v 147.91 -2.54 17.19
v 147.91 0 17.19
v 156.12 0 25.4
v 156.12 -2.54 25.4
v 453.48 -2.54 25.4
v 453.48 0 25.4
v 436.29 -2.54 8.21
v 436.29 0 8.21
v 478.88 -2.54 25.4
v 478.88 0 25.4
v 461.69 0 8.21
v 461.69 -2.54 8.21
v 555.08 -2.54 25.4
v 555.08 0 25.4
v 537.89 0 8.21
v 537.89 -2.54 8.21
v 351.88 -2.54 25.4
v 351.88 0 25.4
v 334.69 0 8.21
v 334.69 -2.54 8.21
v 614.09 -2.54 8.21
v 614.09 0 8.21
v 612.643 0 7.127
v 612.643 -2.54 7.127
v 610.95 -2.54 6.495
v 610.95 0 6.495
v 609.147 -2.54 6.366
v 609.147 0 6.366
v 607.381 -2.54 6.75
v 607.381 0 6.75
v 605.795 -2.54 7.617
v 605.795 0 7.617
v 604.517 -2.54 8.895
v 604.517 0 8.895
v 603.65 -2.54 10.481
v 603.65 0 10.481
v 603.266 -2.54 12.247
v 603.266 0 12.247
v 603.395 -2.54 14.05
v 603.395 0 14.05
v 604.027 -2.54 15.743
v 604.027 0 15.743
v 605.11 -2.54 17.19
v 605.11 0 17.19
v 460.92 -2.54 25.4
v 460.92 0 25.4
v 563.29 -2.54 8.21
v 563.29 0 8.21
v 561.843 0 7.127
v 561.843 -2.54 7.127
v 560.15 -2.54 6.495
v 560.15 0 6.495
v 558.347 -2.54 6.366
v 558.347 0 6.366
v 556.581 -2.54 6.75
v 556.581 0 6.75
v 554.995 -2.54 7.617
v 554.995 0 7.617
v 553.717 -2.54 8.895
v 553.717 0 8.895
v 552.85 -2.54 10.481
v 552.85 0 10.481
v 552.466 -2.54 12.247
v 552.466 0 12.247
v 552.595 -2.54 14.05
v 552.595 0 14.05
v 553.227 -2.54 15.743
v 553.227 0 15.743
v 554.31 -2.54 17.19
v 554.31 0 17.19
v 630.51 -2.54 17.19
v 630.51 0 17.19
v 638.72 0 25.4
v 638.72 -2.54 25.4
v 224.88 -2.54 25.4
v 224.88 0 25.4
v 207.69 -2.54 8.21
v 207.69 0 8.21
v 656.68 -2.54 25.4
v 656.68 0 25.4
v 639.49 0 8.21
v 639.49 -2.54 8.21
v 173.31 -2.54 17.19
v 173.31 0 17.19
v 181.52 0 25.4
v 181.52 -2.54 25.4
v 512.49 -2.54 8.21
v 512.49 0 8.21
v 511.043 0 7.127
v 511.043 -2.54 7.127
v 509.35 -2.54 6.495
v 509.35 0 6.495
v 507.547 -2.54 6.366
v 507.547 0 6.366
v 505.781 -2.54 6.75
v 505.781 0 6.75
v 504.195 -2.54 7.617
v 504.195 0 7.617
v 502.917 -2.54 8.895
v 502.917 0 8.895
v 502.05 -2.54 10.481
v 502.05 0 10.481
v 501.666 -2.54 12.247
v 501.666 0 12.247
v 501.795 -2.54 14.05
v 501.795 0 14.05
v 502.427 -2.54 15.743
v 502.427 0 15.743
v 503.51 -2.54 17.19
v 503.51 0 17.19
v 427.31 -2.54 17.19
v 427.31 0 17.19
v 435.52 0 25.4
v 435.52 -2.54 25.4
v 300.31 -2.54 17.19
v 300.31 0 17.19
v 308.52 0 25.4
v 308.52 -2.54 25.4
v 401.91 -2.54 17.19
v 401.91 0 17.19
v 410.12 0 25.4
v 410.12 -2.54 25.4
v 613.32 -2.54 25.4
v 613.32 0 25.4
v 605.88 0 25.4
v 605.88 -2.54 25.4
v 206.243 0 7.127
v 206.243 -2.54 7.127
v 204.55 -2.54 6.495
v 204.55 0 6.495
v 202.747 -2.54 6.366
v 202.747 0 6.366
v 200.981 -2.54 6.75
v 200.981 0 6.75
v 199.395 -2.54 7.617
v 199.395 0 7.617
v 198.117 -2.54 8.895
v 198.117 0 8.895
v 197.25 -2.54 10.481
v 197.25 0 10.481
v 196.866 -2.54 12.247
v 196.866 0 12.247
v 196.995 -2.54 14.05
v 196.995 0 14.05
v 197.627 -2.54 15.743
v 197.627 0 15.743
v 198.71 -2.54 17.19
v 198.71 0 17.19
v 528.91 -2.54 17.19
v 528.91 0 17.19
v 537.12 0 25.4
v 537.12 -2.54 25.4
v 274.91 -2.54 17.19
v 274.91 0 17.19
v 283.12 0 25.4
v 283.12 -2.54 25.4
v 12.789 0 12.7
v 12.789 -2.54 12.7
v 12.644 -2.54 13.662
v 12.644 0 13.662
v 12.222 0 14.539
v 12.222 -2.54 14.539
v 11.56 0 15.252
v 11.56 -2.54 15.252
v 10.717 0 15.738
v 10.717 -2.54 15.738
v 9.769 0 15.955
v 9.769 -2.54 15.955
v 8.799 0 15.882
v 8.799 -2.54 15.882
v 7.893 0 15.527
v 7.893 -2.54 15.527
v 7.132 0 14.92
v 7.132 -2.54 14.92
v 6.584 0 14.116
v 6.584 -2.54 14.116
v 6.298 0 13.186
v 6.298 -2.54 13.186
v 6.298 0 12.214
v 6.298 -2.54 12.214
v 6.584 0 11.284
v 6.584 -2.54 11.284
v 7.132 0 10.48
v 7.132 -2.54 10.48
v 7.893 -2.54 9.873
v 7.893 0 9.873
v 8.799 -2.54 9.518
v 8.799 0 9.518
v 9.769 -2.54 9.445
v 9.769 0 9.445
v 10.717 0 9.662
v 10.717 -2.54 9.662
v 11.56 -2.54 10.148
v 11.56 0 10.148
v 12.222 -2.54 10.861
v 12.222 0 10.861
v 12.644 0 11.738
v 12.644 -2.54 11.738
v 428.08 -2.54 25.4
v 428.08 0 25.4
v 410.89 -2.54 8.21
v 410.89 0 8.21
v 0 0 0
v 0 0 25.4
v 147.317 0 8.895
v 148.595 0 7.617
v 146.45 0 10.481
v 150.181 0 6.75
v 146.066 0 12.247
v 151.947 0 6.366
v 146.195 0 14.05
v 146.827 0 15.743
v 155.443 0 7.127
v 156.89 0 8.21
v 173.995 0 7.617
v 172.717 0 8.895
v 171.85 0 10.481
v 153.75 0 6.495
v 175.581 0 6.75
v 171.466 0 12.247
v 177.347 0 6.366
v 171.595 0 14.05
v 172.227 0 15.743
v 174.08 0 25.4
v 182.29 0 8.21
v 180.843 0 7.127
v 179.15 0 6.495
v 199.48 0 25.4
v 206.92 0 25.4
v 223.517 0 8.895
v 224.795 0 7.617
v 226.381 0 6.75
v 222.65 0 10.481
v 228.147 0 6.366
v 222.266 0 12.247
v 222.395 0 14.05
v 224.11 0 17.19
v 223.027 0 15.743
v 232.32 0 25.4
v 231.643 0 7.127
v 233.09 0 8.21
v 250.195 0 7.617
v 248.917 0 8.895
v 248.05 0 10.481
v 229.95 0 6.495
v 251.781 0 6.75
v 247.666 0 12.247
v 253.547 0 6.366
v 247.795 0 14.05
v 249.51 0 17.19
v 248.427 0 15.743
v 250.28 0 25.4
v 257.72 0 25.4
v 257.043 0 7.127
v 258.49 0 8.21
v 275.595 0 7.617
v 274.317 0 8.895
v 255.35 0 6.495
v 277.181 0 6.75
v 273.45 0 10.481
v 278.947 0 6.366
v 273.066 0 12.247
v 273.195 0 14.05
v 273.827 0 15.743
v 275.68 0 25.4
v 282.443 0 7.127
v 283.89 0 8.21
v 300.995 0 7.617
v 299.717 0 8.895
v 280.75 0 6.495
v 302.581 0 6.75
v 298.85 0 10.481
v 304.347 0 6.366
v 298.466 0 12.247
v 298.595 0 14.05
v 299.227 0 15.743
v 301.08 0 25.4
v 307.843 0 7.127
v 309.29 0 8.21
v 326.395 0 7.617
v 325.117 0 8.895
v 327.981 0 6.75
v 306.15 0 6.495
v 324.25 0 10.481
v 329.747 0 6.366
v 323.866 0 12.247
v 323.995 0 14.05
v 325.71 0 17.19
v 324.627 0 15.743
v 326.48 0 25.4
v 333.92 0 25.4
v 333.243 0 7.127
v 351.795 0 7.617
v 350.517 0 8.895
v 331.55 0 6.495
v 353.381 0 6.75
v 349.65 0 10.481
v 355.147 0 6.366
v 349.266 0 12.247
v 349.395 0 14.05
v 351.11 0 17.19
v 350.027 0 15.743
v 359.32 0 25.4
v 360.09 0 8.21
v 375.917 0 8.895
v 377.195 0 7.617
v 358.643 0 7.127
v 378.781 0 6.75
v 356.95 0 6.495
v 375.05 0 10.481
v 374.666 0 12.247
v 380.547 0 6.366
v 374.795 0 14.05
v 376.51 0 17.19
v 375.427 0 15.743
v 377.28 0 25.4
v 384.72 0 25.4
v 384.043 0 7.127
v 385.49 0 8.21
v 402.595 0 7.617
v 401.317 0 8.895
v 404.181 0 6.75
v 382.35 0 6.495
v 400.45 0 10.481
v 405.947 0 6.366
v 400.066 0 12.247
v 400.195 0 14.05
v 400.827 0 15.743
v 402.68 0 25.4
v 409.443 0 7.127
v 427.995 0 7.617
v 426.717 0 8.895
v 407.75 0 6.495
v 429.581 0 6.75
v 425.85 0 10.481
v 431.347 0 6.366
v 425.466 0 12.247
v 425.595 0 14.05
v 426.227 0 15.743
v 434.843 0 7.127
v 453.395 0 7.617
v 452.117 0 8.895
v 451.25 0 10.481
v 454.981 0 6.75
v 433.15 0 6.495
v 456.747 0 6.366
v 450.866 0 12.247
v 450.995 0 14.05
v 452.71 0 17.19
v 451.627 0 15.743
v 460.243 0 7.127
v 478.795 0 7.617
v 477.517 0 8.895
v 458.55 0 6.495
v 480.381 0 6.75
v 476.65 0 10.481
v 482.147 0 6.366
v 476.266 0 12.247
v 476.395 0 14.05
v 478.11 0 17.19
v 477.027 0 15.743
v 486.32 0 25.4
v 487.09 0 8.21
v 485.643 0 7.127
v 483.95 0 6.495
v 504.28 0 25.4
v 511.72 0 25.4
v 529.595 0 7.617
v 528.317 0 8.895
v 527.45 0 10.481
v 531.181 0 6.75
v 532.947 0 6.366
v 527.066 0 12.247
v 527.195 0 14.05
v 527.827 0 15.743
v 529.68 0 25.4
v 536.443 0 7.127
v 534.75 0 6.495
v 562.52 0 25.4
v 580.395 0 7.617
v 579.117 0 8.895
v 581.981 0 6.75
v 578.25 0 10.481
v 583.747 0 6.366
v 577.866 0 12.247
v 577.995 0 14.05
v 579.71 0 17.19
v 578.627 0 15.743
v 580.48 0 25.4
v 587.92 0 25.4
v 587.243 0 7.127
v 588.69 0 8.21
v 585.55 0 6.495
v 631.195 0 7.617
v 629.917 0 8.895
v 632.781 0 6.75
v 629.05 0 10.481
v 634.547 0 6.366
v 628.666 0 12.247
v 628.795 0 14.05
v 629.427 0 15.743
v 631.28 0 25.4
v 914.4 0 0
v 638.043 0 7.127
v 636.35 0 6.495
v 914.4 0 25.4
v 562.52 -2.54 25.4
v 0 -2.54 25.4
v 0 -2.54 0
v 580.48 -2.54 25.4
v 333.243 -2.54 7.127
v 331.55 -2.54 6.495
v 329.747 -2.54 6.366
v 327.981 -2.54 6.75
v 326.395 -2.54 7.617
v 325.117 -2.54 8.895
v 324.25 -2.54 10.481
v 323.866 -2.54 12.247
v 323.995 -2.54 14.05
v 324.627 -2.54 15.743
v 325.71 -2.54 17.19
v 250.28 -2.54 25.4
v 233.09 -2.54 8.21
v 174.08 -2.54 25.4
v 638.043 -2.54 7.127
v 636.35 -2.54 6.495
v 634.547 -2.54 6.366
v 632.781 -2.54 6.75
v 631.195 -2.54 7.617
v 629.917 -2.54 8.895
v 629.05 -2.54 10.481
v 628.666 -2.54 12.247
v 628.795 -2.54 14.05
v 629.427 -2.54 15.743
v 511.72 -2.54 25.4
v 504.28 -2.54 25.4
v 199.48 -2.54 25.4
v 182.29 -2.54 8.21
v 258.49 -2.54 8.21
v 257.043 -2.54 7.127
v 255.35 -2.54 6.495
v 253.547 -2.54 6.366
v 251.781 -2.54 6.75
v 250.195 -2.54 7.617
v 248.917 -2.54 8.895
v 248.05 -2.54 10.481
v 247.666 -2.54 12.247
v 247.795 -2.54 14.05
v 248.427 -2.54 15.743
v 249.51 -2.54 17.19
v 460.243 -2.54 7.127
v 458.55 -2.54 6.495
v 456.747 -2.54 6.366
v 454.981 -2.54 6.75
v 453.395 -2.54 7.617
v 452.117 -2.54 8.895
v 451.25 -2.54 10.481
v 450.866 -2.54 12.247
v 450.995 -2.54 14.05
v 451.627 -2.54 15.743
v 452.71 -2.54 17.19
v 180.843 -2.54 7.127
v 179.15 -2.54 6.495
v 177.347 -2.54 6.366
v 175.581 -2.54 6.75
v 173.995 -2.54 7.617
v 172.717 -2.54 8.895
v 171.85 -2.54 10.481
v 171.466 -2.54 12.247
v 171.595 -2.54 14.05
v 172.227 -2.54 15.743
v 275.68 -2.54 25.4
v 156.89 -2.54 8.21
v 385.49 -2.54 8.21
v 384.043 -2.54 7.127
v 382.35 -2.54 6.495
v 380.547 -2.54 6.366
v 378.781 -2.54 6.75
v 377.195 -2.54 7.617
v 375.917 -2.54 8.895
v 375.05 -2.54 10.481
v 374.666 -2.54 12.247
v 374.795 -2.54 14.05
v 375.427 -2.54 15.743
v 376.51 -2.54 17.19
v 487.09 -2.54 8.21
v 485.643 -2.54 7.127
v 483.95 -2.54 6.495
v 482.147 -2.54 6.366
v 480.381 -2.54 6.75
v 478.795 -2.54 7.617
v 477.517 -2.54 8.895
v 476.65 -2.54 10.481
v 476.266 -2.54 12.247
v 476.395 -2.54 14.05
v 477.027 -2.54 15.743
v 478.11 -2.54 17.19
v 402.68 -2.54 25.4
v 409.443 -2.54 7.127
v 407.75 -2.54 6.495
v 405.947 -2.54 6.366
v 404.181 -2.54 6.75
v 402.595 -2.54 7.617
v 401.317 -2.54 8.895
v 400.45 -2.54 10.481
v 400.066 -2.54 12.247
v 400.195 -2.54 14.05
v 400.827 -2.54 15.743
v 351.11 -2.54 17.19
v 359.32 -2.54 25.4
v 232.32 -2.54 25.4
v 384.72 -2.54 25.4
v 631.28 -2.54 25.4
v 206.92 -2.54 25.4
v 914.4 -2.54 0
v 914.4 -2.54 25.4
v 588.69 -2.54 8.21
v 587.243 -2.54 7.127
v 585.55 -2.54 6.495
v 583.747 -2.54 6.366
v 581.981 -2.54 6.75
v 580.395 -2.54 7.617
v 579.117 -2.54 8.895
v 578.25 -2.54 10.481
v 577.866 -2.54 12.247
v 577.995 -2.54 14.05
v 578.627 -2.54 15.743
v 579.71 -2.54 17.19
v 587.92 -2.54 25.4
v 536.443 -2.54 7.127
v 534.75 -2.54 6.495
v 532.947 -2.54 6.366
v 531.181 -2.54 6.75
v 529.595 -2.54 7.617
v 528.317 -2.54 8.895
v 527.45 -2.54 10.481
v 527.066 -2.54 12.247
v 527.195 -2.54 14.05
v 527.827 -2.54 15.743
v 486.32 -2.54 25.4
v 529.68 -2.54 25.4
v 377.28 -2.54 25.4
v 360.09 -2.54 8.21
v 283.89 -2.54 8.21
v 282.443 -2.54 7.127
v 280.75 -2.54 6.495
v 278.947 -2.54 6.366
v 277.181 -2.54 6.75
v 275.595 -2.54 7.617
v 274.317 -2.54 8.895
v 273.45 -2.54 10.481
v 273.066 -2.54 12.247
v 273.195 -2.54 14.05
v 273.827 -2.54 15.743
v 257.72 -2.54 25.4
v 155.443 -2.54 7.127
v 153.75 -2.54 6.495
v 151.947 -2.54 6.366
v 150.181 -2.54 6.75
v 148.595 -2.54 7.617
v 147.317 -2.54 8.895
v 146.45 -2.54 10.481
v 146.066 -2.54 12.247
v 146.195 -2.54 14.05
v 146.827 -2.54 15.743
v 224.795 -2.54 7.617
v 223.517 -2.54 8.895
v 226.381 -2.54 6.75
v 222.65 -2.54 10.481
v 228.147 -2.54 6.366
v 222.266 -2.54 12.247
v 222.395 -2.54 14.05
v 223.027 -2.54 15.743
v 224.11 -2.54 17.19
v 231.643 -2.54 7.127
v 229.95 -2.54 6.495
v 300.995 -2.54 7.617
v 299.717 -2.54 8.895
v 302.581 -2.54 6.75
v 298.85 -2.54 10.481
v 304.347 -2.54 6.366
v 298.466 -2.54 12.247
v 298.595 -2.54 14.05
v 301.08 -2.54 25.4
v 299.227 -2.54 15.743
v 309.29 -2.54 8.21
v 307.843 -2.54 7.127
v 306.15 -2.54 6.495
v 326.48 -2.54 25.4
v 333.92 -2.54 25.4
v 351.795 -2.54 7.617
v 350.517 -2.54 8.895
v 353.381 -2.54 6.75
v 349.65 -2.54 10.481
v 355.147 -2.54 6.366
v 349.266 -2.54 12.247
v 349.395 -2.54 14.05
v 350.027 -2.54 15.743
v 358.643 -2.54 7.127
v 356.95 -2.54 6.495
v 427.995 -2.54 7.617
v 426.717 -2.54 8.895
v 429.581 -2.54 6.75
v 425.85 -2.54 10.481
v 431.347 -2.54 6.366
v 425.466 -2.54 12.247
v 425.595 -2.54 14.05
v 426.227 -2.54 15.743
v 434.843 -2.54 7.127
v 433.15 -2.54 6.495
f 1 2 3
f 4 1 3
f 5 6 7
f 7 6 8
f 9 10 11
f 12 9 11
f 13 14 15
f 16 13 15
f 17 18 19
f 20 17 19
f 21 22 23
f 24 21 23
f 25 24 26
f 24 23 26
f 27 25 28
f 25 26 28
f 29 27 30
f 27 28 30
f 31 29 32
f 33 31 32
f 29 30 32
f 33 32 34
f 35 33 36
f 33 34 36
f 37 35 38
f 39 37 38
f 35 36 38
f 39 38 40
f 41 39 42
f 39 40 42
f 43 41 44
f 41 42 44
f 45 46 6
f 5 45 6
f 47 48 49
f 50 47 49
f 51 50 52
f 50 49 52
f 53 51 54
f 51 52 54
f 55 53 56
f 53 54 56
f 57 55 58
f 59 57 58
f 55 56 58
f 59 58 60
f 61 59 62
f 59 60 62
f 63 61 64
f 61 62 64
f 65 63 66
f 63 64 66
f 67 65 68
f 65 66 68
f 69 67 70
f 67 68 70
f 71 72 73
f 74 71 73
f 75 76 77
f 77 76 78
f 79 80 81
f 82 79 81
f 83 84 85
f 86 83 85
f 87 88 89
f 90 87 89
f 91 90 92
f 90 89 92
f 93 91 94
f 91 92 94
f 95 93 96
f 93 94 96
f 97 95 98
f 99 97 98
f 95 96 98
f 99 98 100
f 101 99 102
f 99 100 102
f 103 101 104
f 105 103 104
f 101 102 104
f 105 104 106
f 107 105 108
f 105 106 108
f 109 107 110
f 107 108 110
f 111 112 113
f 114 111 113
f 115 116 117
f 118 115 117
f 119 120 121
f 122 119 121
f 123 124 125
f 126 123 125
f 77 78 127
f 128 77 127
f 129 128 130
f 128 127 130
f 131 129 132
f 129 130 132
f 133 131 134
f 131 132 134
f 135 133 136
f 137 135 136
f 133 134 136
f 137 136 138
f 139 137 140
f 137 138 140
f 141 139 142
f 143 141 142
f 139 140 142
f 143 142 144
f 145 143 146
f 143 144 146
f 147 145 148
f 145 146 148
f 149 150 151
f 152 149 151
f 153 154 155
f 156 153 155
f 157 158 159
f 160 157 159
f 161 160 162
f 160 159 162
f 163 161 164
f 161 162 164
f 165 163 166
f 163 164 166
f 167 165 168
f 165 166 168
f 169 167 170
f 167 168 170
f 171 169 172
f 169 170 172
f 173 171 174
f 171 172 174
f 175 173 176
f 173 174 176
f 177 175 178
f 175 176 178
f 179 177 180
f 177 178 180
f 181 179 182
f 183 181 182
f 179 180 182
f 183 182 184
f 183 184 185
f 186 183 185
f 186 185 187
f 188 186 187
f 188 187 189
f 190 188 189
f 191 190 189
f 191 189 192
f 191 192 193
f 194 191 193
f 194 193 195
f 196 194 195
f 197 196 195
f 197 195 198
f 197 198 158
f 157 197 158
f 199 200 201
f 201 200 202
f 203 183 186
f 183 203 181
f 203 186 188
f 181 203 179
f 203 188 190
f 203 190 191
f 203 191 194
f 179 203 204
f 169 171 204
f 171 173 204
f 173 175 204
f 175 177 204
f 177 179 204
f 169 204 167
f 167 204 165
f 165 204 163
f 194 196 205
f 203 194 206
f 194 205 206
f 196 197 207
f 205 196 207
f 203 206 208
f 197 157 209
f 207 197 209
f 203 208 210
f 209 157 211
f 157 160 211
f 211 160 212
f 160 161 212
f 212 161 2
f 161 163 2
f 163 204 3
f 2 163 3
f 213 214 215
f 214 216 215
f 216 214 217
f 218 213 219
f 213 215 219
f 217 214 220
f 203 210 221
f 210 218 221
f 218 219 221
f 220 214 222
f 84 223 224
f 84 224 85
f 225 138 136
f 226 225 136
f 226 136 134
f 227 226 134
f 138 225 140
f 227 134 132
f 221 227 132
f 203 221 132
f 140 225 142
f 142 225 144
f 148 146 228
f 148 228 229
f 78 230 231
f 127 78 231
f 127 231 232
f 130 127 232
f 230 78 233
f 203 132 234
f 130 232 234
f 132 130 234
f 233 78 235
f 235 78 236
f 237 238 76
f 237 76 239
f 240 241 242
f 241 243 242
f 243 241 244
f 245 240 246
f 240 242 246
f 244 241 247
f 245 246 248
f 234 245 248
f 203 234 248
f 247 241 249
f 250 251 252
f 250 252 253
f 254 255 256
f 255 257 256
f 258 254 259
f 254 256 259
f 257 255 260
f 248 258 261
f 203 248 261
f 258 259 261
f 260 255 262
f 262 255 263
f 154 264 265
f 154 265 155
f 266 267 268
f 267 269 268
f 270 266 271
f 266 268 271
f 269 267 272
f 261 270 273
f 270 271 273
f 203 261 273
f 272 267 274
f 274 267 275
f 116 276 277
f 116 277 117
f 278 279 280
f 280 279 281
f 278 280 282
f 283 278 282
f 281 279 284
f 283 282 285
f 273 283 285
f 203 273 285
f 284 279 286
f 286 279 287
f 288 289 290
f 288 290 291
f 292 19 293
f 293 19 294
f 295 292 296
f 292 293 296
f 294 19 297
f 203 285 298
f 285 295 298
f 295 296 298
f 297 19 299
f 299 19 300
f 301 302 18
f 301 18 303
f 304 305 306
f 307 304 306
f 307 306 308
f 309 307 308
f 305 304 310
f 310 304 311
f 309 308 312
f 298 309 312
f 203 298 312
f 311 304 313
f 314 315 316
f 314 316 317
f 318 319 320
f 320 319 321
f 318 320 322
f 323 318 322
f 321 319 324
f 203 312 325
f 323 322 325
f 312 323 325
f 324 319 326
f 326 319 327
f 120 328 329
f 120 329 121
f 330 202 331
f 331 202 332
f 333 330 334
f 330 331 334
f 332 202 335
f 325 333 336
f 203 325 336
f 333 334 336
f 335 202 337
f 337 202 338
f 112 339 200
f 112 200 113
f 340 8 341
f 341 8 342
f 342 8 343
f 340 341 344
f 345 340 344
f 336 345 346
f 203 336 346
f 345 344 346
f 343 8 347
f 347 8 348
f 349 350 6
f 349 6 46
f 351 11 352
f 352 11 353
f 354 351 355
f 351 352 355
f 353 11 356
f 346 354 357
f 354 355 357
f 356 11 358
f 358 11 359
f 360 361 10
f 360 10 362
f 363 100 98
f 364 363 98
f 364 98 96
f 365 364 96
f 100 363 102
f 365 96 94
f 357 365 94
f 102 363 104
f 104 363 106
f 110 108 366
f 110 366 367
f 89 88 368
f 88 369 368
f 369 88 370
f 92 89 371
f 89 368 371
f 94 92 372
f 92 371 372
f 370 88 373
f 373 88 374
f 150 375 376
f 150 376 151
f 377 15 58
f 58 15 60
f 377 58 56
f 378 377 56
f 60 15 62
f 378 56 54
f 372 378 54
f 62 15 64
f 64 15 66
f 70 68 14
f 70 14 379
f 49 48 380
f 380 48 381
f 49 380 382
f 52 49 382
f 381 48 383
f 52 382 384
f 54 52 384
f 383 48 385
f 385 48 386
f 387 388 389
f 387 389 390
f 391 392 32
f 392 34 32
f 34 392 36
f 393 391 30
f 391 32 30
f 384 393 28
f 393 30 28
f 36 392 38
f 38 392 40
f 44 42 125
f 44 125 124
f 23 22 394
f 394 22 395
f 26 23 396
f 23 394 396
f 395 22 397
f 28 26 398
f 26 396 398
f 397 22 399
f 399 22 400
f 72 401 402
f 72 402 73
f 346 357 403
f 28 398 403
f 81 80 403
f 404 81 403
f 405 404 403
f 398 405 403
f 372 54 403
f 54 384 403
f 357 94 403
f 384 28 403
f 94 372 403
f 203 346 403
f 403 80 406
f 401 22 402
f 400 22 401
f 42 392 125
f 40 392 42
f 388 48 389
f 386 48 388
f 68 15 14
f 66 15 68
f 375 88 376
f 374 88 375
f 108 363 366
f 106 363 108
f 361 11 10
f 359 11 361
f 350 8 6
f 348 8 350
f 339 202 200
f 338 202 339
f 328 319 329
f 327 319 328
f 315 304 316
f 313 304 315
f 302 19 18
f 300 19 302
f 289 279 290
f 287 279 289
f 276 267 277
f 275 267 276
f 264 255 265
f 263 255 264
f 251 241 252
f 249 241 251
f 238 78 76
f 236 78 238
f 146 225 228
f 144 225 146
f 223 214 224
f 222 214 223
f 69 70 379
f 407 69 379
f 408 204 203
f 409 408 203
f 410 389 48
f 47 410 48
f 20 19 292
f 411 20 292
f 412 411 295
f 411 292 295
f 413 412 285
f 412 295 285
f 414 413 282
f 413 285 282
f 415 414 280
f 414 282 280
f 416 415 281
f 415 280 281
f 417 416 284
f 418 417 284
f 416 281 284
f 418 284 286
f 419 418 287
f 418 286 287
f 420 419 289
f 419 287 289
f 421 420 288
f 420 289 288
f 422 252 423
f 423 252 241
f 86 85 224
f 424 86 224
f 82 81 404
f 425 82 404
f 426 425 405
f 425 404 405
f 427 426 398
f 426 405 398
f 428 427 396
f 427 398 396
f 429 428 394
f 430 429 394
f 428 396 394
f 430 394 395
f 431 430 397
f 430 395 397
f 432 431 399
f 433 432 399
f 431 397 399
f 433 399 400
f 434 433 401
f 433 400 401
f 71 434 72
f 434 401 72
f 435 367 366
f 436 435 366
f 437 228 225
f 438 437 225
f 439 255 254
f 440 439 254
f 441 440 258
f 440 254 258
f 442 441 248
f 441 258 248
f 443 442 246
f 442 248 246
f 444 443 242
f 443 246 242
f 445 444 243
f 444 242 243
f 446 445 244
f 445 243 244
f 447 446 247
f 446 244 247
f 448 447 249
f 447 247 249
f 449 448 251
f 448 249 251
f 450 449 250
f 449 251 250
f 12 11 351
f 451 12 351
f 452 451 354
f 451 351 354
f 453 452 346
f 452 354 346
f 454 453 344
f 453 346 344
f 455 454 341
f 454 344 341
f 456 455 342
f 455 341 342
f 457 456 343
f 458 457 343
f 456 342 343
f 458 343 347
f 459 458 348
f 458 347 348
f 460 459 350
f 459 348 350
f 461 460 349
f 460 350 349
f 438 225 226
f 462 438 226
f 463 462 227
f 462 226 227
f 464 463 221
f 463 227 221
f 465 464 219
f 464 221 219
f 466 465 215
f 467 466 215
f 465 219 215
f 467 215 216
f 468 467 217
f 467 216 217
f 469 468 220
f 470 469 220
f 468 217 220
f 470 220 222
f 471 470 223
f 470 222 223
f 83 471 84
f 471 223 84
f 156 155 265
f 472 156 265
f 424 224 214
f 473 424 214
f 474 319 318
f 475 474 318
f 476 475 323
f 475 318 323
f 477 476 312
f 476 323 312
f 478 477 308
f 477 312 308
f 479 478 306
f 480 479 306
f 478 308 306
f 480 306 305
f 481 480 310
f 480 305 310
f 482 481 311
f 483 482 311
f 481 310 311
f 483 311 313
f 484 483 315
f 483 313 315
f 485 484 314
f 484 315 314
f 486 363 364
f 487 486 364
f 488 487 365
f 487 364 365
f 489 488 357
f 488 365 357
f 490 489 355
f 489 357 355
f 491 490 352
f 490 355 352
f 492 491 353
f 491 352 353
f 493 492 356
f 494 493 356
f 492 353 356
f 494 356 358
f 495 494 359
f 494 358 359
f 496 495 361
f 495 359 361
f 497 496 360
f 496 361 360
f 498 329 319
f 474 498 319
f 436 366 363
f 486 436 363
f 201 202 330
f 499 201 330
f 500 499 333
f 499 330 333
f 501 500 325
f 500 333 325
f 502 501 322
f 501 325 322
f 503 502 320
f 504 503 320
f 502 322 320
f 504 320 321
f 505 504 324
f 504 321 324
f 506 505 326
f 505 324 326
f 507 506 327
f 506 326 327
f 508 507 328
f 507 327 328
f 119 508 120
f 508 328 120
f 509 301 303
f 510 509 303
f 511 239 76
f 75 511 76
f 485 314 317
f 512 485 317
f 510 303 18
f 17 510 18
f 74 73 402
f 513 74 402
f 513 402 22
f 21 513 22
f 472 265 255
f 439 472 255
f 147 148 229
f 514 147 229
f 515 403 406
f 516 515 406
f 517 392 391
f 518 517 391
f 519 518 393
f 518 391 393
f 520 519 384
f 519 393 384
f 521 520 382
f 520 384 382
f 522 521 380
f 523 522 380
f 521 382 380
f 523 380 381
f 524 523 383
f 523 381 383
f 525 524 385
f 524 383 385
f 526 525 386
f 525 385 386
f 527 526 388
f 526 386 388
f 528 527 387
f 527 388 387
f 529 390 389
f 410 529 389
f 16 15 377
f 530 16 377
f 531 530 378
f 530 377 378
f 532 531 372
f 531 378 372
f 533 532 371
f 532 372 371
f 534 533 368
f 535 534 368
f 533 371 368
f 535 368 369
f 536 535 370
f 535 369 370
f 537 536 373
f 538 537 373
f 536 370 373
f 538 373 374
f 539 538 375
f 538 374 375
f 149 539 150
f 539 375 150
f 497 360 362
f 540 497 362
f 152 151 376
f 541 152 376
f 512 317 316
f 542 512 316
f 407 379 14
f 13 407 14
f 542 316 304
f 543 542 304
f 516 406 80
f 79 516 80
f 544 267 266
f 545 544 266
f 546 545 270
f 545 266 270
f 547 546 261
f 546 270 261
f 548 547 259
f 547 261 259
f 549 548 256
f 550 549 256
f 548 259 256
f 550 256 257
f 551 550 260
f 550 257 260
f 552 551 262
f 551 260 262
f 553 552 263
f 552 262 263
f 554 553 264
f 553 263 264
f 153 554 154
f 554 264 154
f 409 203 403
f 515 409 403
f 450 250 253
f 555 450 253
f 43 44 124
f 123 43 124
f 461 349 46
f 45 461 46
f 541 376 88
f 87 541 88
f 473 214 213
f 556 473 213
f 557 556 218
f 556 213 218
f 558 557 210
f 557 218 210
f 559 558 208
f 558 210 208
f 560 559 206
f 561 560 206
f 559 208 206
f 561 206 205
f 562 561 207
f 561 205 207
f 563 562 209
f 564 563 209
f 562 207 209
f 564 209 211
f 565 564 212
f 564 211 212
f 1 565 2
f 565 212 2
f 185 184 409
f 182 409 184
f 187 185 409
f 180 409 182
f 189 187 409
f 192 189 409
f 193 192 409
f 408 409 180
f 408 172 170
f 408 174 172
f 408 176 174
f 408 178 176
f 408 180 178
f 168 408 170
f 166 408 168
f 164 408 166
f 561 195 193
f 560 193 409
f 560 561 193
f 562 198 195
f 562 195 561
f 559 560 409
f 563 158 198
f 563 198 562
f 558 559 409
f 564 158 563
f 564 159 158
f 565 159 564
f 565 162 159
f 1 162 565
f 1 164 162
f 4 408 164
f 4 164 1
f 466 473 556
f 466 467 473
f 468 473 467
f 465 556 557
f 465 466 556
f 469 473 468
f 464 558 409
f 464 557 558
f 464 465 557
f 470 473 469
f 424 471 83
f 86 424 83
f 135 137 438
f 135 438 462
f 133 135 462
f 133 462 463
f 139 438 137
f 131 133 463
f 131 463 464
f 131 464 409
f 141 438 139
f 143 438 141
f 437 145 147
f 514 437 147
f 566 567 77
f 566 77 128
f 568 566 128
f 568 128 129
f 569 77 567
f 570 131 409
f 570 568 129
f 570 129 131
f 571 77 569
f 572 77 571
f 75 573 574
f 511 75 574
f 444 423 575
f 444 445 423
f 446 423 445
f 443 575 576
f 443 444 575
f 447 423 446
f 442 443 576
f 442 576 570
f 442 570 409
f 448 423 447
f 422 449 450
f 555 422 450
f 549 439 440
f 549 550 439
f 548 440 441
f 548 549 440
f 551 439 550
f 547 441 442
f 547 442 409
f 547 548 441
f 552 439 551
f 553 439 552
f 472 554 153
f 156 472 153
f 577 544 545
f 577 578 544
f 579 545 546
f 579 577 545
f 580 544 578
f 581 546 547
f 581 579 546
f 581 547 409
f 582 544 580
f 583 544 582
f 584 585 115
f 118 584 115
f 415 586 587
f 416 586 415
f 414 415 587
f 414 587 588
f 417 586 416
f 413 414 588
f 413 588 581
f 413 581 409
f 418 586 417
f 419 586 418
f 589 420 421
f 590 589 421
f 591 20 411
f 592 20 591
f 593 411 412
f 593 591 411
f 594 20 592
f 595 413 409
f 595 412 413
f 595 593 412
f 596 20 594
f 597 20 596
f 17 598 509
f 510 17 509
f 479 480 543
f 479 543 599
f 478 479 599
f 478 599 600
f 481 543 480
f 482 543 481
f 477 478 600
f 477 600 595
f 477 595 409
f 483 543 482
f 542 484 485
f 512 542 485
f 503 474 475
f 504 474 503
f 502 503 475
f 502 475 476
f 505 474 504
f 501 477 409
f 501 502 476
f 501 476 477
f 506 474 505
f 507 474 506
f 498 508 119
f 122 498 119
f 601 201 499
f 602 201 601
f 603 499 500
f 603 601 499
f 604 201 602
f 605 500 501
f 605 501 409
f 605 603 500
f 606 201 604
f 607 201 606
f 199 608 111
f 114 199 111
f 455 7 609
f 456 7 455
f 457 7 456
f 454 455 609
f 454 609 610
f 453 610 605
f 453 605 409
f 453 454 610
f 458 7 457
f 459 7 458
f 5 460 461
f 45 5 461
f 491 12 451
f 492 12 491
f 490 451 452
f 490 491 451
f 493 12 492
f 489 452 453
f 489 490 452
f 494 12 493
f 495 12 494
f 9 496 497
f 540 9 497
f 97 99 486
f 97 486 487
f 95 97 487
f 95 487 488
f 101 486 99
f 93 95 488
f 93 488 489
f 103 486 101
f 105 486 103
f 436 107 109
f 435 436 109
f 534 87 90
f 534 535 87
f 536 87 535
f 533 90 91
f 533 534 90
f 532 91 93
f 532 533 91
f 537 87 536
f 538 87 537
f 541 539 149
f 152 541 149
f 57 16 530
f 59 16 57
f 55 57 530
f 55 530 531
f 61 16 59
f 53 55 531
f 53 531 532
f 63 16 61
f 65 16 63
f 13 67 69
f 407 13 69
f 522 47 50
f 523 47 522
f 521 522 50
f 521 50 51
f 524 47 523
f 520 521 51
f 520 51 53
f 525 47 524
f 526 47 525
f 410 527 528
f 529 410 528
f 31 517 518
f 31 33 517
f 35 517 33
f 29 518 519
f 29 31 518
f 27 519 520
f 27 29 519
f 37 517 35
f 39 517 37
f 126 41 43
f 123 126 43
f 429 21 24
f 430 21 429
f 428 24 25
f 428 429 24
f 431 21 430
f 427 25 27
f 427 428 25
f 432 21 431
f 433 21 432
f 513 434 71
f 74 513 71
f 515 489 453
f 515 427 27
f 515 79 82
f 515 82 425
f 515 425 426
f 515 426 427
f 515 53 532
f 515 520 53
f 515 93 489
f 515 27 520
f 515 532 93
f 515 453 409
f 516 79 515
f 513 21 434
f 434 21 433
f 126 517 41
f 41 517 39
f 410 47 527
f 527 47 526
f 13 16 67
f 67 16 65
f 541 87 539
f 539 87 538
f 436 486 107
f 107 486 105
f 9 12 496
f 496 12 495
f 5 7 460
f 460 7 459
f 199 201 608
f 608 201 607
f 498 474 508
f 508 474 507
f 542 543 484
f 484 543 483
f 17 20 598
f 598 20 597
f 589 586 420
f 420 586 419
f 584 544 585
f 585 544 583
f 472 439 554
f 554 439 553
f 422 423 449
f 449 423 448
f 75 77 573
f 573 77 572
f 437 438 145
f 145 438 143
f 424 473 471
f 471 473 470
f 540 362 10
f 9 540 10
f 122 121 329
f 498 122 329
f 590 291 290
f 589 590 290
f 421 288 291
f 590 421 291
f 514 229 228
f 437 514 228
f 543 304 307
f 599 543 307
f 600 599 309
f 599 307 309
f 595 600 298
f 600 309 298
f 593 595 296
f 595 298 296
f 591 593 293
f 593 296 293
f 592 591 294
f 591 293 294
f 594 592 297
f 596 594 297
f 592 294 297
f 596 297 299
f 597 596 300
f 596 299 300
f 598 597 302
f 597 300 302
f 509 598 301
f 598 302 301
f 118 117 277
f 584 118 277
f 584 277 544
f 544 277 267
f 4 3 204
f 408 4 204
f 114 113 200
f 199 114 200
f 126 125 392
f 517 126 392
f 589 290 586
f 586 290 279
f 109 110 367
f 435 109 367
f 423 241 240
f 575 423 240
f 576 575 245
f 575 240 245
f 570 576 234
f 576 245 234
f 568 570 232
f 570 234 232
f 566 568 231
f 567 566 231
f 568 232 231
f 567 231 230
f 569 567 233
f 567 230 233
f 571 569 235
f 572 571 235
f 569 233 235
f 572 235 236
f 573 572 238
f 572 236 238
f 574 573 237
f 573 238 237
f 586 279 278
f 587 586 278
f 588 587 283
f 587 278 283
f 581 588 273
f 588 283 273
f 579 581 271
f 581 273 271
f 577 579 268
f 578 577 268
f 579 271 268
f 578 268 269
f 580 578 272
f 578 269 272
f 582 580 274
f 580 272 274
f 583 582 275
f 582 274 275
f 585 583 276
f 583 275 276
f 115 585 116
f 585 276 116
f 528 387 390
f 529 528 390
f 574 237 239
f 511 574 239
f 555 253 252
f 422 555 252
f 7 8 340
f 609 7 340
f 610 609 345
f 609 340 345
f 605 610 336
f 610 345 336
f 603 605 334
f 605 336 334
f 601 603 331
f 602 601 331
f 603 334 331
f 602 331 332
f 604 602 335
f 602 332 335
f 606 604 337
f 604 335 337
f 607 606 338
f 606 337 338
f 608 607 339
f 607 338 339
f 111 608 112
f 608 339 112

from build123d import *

# Parameters (mm, degrees)
F1_DEPTH = 2.54
F2_R     = 3.2639
F3_DEPTH = 2.541


with BuildPart() as f1:
    # F0 (on Front) → F1 (new body)
    with BuildSketch(Plane.XZ):
        with BuildLine():
            Line((0, 25.4), (0, 0))
            Line((0, 0), (914.4, 0))
            Line((914.4, 0), (914.4, 25.4))
            Line((914.4, 25.4), (656.680256, 25.4))
            Line((656.680256, 25.4), (639.490128, 8.209872))
            ThreePointArc((639.490128, 8.209872), (630.509872, 8.209872), (630.509872, 17.190128))
            Line((630.509872, 17.190128), (638.719744, 25.4))
            Line((638.719744, 25.4), (631.280256, 25.4))
            Line((631.280256, 25.4), (614.090128, 8.209872))
            ThreePointArc((614.090128, 8.209872), (605.109872, 8.209872), (605.109872, 17.190128))
            Line((605.109872, 17.190128), (613.319744, 25.4))
            Line((613.319744, 25.4), (605.880256, 25.4))
            Line((605.880256, 25.4), (588.690128, 8.209872))
            ThreePointArc((588.690128, 8.209872), (579.709872, 8.209872), (579.709872, 17.190128))
            Line((579.709872, 17.190128), (587.919744, 25.4))
            Line((587.919744, 25.4), (580.480256, 25.4))
            Line((580.480256, 25.4), (563.290128, 8.209872))
            ThreePointArc((563.290128, 8.209872), (554.309872, 8.209872), (554.309872, 17.190128))
            Line((554.309872, 17.190128), (562.519744, 25.4))
            Line((562.519744, 25.4), (555.080256, 25.4))
            Line((555.080256, 25.4), (537.890128, 8.209872))
            ThreePointArc((537.890128, 8.209872), (528.909872, 8.209872), (528.909872, 17.190128))
            Line((528.909872, 17.190128), (537.119744, 25.4))
            Line((537.119744, 25.4), (529.680256, 25.4))
            Line((529.680256, 25.4), (512.490128, 8.209872))
            ThreePointArc((512.490128, 8.209872), (503.509872, 8.209872), (503.509872, 17.190128))
            Line((503.509872, 17.190128), (511.719744, 25.4))
            Line((511.719744, 25.4), (504.280256, 25.4))
            Line((504.280256, 25.4), (487.090128, 8.209872))
            ThreePointArc((487.090128, 8.209872), (478.109872, 8.209872), (478.109872, 17.190128))
            Line((478.109872, 17.190128), (486.319744, 25.4))
            Line((486.319744, 25.4), (478.880256, 25.4))
            Line((478.880256, 25.4), (461.690128, 8.209872))
            ThreePointArc((461.690128, 8.209872), (452.709872, 8.209872), (452.709872, 17.190128))
            Line((452.709872, 17.190128), (460.919744, 25.4))
            Line((460.919744, 25.4), (453.480256, 25.4))
            Line((453.480256, 25.4), (436.290128, 8.209872))
            ThreePointArc((436.290128, 8.209872), (427.309872, 8.209872), (427.309872, 17.190128))
            Line((427.309872, 17.190128), (435.519744, 25.4))
            Line((435.519744, 25.4), (428.080256, 25.4))
            Line((428.080256, 25.4), (410.890128, 8.209872))
            ThreePointArc((410.890128, 8.209872), (401.909872, 8.209872), (401.909872, 17.190128))
            Line((401.909872, 17.190128), (410.119744, 25.4))
            Line((410.119744, 25.4), (402.680256, 25.4))
            Line((402.680256, 25.4), (385.490128, 8.209872))
            ThreePointArc((385.490128, 8.209872), (376.509872, 8.209872), (376.509872, 17.190128))
            Line((376.509872, 17.190128), (384.719744, 25.4))
            Line((384.719744, 25.4), (377.280256, 25.4))
            Line((377.280256, 25.4), (360.090128, 8.209872))
            ThreePointArc((360.090128, 8.209872), (351.109872, 8.209872), (351.109872, 17.190128))
            Line((351.109872, 17.190128), (359.319744, 25.4))
            Line((359.319744, 25.4), (351.880256, 25.4))
            Line((351.880256, 25.4), (334.690128, 8.209872))
            ThreePointArc((334.690128, 8.209872), (325.709872, 8.209872), (325.709872, 17.190128))
            Line((325.709872, 17.190128), (333.919744, 25.4))
            Line((333.919744, 25.4), (326.480256, 25.4))
            Line((326.480256, 25.4), (309.290128, 8.209872))
            ThreePointArc((309.290128, 8.209872), (300.309872, 8.209872), (300.309872, 17.190128))
            Line((300.309872, 17.190128), (308.519744, 25.4))
            Line((308.519744, 25.4), (301.080256, 25.4))
            Line((301.080256, 25.4), (283.890128, 8.209872))
            ThreePointArc((283.890128, 8.209872), (274.909872, 8.209872), (274.909872, 17.190128))
            Line((274.909872, 17.190128), (283.119744, 25.4))
            Line((283.119744, 25.4), (275.680256, 25.4))
            Line((275.680256, 25.4), (258.490128, 8.209872))
            ThreePointArc((258.490128, 8.209872), (249.509872, 8.209872), (249.509872, 17.190128))
            Line((249.509872, 17.190128), (257.719744, 25.4))
            Line((257.719744, 25.4), (250.280256, 25.4))
            Line((250.280256, 25.4), (233.090128, 8.209872))
            ThreePointArc((233.090128, 8.209872), (224.109872, 8.209872), (224.109872, 17.190128))
            Line((224.109872, 17.190128), (232.319744, 25.4))
            Line((232.319744, 25.4), (224.880256, 25.4))
            Line((224.880256, 25.4), (207.690128, 8.209872))
            ThreePointArc((207.690128, 8.209872), (198.709872, 8.209872), (198.709872, 17.190128))
            Line((198.709872, 17.190128), (206.919744, 25.4))
            Line((206.919744, 25.4), (199.480256, 25.4))
            Line((199.480256, 25.4), (182.290128, 8.209872))
            ThreePointArc((182.290128, 8.209872), (173.309872, 8.209872), (173.309872, 17.190128))
            Line((173.309872, 17.190128), (181.519744, 25.4))
            Line((181.519744, 25.4), (174.080256, 25.4))
            Line((174.080256, 25.4), (156.890128, 8.209872))
            ThreePointArc((156.890128, 8.209872), (147.909872, 8.209872), (147.909872, 17.190128))
            Line((147.909872, 17.190128), (156.119744, 25.4))
            Line((156.119744, 25.4), (0, 25.4))
        make_face()
    extrude(amount=F1_DEPTH)

    # F2 (on face) → F3 (cut, through all)
    with BuildSketch(Plane.XZ.offset(2.54)):
        with Locations((9.525, 12.7)):
            Circle(F2_R)
    extrude(amount=-F3_DEPTH, mode=Mode.SUBTRACT)


solid = f1.part
